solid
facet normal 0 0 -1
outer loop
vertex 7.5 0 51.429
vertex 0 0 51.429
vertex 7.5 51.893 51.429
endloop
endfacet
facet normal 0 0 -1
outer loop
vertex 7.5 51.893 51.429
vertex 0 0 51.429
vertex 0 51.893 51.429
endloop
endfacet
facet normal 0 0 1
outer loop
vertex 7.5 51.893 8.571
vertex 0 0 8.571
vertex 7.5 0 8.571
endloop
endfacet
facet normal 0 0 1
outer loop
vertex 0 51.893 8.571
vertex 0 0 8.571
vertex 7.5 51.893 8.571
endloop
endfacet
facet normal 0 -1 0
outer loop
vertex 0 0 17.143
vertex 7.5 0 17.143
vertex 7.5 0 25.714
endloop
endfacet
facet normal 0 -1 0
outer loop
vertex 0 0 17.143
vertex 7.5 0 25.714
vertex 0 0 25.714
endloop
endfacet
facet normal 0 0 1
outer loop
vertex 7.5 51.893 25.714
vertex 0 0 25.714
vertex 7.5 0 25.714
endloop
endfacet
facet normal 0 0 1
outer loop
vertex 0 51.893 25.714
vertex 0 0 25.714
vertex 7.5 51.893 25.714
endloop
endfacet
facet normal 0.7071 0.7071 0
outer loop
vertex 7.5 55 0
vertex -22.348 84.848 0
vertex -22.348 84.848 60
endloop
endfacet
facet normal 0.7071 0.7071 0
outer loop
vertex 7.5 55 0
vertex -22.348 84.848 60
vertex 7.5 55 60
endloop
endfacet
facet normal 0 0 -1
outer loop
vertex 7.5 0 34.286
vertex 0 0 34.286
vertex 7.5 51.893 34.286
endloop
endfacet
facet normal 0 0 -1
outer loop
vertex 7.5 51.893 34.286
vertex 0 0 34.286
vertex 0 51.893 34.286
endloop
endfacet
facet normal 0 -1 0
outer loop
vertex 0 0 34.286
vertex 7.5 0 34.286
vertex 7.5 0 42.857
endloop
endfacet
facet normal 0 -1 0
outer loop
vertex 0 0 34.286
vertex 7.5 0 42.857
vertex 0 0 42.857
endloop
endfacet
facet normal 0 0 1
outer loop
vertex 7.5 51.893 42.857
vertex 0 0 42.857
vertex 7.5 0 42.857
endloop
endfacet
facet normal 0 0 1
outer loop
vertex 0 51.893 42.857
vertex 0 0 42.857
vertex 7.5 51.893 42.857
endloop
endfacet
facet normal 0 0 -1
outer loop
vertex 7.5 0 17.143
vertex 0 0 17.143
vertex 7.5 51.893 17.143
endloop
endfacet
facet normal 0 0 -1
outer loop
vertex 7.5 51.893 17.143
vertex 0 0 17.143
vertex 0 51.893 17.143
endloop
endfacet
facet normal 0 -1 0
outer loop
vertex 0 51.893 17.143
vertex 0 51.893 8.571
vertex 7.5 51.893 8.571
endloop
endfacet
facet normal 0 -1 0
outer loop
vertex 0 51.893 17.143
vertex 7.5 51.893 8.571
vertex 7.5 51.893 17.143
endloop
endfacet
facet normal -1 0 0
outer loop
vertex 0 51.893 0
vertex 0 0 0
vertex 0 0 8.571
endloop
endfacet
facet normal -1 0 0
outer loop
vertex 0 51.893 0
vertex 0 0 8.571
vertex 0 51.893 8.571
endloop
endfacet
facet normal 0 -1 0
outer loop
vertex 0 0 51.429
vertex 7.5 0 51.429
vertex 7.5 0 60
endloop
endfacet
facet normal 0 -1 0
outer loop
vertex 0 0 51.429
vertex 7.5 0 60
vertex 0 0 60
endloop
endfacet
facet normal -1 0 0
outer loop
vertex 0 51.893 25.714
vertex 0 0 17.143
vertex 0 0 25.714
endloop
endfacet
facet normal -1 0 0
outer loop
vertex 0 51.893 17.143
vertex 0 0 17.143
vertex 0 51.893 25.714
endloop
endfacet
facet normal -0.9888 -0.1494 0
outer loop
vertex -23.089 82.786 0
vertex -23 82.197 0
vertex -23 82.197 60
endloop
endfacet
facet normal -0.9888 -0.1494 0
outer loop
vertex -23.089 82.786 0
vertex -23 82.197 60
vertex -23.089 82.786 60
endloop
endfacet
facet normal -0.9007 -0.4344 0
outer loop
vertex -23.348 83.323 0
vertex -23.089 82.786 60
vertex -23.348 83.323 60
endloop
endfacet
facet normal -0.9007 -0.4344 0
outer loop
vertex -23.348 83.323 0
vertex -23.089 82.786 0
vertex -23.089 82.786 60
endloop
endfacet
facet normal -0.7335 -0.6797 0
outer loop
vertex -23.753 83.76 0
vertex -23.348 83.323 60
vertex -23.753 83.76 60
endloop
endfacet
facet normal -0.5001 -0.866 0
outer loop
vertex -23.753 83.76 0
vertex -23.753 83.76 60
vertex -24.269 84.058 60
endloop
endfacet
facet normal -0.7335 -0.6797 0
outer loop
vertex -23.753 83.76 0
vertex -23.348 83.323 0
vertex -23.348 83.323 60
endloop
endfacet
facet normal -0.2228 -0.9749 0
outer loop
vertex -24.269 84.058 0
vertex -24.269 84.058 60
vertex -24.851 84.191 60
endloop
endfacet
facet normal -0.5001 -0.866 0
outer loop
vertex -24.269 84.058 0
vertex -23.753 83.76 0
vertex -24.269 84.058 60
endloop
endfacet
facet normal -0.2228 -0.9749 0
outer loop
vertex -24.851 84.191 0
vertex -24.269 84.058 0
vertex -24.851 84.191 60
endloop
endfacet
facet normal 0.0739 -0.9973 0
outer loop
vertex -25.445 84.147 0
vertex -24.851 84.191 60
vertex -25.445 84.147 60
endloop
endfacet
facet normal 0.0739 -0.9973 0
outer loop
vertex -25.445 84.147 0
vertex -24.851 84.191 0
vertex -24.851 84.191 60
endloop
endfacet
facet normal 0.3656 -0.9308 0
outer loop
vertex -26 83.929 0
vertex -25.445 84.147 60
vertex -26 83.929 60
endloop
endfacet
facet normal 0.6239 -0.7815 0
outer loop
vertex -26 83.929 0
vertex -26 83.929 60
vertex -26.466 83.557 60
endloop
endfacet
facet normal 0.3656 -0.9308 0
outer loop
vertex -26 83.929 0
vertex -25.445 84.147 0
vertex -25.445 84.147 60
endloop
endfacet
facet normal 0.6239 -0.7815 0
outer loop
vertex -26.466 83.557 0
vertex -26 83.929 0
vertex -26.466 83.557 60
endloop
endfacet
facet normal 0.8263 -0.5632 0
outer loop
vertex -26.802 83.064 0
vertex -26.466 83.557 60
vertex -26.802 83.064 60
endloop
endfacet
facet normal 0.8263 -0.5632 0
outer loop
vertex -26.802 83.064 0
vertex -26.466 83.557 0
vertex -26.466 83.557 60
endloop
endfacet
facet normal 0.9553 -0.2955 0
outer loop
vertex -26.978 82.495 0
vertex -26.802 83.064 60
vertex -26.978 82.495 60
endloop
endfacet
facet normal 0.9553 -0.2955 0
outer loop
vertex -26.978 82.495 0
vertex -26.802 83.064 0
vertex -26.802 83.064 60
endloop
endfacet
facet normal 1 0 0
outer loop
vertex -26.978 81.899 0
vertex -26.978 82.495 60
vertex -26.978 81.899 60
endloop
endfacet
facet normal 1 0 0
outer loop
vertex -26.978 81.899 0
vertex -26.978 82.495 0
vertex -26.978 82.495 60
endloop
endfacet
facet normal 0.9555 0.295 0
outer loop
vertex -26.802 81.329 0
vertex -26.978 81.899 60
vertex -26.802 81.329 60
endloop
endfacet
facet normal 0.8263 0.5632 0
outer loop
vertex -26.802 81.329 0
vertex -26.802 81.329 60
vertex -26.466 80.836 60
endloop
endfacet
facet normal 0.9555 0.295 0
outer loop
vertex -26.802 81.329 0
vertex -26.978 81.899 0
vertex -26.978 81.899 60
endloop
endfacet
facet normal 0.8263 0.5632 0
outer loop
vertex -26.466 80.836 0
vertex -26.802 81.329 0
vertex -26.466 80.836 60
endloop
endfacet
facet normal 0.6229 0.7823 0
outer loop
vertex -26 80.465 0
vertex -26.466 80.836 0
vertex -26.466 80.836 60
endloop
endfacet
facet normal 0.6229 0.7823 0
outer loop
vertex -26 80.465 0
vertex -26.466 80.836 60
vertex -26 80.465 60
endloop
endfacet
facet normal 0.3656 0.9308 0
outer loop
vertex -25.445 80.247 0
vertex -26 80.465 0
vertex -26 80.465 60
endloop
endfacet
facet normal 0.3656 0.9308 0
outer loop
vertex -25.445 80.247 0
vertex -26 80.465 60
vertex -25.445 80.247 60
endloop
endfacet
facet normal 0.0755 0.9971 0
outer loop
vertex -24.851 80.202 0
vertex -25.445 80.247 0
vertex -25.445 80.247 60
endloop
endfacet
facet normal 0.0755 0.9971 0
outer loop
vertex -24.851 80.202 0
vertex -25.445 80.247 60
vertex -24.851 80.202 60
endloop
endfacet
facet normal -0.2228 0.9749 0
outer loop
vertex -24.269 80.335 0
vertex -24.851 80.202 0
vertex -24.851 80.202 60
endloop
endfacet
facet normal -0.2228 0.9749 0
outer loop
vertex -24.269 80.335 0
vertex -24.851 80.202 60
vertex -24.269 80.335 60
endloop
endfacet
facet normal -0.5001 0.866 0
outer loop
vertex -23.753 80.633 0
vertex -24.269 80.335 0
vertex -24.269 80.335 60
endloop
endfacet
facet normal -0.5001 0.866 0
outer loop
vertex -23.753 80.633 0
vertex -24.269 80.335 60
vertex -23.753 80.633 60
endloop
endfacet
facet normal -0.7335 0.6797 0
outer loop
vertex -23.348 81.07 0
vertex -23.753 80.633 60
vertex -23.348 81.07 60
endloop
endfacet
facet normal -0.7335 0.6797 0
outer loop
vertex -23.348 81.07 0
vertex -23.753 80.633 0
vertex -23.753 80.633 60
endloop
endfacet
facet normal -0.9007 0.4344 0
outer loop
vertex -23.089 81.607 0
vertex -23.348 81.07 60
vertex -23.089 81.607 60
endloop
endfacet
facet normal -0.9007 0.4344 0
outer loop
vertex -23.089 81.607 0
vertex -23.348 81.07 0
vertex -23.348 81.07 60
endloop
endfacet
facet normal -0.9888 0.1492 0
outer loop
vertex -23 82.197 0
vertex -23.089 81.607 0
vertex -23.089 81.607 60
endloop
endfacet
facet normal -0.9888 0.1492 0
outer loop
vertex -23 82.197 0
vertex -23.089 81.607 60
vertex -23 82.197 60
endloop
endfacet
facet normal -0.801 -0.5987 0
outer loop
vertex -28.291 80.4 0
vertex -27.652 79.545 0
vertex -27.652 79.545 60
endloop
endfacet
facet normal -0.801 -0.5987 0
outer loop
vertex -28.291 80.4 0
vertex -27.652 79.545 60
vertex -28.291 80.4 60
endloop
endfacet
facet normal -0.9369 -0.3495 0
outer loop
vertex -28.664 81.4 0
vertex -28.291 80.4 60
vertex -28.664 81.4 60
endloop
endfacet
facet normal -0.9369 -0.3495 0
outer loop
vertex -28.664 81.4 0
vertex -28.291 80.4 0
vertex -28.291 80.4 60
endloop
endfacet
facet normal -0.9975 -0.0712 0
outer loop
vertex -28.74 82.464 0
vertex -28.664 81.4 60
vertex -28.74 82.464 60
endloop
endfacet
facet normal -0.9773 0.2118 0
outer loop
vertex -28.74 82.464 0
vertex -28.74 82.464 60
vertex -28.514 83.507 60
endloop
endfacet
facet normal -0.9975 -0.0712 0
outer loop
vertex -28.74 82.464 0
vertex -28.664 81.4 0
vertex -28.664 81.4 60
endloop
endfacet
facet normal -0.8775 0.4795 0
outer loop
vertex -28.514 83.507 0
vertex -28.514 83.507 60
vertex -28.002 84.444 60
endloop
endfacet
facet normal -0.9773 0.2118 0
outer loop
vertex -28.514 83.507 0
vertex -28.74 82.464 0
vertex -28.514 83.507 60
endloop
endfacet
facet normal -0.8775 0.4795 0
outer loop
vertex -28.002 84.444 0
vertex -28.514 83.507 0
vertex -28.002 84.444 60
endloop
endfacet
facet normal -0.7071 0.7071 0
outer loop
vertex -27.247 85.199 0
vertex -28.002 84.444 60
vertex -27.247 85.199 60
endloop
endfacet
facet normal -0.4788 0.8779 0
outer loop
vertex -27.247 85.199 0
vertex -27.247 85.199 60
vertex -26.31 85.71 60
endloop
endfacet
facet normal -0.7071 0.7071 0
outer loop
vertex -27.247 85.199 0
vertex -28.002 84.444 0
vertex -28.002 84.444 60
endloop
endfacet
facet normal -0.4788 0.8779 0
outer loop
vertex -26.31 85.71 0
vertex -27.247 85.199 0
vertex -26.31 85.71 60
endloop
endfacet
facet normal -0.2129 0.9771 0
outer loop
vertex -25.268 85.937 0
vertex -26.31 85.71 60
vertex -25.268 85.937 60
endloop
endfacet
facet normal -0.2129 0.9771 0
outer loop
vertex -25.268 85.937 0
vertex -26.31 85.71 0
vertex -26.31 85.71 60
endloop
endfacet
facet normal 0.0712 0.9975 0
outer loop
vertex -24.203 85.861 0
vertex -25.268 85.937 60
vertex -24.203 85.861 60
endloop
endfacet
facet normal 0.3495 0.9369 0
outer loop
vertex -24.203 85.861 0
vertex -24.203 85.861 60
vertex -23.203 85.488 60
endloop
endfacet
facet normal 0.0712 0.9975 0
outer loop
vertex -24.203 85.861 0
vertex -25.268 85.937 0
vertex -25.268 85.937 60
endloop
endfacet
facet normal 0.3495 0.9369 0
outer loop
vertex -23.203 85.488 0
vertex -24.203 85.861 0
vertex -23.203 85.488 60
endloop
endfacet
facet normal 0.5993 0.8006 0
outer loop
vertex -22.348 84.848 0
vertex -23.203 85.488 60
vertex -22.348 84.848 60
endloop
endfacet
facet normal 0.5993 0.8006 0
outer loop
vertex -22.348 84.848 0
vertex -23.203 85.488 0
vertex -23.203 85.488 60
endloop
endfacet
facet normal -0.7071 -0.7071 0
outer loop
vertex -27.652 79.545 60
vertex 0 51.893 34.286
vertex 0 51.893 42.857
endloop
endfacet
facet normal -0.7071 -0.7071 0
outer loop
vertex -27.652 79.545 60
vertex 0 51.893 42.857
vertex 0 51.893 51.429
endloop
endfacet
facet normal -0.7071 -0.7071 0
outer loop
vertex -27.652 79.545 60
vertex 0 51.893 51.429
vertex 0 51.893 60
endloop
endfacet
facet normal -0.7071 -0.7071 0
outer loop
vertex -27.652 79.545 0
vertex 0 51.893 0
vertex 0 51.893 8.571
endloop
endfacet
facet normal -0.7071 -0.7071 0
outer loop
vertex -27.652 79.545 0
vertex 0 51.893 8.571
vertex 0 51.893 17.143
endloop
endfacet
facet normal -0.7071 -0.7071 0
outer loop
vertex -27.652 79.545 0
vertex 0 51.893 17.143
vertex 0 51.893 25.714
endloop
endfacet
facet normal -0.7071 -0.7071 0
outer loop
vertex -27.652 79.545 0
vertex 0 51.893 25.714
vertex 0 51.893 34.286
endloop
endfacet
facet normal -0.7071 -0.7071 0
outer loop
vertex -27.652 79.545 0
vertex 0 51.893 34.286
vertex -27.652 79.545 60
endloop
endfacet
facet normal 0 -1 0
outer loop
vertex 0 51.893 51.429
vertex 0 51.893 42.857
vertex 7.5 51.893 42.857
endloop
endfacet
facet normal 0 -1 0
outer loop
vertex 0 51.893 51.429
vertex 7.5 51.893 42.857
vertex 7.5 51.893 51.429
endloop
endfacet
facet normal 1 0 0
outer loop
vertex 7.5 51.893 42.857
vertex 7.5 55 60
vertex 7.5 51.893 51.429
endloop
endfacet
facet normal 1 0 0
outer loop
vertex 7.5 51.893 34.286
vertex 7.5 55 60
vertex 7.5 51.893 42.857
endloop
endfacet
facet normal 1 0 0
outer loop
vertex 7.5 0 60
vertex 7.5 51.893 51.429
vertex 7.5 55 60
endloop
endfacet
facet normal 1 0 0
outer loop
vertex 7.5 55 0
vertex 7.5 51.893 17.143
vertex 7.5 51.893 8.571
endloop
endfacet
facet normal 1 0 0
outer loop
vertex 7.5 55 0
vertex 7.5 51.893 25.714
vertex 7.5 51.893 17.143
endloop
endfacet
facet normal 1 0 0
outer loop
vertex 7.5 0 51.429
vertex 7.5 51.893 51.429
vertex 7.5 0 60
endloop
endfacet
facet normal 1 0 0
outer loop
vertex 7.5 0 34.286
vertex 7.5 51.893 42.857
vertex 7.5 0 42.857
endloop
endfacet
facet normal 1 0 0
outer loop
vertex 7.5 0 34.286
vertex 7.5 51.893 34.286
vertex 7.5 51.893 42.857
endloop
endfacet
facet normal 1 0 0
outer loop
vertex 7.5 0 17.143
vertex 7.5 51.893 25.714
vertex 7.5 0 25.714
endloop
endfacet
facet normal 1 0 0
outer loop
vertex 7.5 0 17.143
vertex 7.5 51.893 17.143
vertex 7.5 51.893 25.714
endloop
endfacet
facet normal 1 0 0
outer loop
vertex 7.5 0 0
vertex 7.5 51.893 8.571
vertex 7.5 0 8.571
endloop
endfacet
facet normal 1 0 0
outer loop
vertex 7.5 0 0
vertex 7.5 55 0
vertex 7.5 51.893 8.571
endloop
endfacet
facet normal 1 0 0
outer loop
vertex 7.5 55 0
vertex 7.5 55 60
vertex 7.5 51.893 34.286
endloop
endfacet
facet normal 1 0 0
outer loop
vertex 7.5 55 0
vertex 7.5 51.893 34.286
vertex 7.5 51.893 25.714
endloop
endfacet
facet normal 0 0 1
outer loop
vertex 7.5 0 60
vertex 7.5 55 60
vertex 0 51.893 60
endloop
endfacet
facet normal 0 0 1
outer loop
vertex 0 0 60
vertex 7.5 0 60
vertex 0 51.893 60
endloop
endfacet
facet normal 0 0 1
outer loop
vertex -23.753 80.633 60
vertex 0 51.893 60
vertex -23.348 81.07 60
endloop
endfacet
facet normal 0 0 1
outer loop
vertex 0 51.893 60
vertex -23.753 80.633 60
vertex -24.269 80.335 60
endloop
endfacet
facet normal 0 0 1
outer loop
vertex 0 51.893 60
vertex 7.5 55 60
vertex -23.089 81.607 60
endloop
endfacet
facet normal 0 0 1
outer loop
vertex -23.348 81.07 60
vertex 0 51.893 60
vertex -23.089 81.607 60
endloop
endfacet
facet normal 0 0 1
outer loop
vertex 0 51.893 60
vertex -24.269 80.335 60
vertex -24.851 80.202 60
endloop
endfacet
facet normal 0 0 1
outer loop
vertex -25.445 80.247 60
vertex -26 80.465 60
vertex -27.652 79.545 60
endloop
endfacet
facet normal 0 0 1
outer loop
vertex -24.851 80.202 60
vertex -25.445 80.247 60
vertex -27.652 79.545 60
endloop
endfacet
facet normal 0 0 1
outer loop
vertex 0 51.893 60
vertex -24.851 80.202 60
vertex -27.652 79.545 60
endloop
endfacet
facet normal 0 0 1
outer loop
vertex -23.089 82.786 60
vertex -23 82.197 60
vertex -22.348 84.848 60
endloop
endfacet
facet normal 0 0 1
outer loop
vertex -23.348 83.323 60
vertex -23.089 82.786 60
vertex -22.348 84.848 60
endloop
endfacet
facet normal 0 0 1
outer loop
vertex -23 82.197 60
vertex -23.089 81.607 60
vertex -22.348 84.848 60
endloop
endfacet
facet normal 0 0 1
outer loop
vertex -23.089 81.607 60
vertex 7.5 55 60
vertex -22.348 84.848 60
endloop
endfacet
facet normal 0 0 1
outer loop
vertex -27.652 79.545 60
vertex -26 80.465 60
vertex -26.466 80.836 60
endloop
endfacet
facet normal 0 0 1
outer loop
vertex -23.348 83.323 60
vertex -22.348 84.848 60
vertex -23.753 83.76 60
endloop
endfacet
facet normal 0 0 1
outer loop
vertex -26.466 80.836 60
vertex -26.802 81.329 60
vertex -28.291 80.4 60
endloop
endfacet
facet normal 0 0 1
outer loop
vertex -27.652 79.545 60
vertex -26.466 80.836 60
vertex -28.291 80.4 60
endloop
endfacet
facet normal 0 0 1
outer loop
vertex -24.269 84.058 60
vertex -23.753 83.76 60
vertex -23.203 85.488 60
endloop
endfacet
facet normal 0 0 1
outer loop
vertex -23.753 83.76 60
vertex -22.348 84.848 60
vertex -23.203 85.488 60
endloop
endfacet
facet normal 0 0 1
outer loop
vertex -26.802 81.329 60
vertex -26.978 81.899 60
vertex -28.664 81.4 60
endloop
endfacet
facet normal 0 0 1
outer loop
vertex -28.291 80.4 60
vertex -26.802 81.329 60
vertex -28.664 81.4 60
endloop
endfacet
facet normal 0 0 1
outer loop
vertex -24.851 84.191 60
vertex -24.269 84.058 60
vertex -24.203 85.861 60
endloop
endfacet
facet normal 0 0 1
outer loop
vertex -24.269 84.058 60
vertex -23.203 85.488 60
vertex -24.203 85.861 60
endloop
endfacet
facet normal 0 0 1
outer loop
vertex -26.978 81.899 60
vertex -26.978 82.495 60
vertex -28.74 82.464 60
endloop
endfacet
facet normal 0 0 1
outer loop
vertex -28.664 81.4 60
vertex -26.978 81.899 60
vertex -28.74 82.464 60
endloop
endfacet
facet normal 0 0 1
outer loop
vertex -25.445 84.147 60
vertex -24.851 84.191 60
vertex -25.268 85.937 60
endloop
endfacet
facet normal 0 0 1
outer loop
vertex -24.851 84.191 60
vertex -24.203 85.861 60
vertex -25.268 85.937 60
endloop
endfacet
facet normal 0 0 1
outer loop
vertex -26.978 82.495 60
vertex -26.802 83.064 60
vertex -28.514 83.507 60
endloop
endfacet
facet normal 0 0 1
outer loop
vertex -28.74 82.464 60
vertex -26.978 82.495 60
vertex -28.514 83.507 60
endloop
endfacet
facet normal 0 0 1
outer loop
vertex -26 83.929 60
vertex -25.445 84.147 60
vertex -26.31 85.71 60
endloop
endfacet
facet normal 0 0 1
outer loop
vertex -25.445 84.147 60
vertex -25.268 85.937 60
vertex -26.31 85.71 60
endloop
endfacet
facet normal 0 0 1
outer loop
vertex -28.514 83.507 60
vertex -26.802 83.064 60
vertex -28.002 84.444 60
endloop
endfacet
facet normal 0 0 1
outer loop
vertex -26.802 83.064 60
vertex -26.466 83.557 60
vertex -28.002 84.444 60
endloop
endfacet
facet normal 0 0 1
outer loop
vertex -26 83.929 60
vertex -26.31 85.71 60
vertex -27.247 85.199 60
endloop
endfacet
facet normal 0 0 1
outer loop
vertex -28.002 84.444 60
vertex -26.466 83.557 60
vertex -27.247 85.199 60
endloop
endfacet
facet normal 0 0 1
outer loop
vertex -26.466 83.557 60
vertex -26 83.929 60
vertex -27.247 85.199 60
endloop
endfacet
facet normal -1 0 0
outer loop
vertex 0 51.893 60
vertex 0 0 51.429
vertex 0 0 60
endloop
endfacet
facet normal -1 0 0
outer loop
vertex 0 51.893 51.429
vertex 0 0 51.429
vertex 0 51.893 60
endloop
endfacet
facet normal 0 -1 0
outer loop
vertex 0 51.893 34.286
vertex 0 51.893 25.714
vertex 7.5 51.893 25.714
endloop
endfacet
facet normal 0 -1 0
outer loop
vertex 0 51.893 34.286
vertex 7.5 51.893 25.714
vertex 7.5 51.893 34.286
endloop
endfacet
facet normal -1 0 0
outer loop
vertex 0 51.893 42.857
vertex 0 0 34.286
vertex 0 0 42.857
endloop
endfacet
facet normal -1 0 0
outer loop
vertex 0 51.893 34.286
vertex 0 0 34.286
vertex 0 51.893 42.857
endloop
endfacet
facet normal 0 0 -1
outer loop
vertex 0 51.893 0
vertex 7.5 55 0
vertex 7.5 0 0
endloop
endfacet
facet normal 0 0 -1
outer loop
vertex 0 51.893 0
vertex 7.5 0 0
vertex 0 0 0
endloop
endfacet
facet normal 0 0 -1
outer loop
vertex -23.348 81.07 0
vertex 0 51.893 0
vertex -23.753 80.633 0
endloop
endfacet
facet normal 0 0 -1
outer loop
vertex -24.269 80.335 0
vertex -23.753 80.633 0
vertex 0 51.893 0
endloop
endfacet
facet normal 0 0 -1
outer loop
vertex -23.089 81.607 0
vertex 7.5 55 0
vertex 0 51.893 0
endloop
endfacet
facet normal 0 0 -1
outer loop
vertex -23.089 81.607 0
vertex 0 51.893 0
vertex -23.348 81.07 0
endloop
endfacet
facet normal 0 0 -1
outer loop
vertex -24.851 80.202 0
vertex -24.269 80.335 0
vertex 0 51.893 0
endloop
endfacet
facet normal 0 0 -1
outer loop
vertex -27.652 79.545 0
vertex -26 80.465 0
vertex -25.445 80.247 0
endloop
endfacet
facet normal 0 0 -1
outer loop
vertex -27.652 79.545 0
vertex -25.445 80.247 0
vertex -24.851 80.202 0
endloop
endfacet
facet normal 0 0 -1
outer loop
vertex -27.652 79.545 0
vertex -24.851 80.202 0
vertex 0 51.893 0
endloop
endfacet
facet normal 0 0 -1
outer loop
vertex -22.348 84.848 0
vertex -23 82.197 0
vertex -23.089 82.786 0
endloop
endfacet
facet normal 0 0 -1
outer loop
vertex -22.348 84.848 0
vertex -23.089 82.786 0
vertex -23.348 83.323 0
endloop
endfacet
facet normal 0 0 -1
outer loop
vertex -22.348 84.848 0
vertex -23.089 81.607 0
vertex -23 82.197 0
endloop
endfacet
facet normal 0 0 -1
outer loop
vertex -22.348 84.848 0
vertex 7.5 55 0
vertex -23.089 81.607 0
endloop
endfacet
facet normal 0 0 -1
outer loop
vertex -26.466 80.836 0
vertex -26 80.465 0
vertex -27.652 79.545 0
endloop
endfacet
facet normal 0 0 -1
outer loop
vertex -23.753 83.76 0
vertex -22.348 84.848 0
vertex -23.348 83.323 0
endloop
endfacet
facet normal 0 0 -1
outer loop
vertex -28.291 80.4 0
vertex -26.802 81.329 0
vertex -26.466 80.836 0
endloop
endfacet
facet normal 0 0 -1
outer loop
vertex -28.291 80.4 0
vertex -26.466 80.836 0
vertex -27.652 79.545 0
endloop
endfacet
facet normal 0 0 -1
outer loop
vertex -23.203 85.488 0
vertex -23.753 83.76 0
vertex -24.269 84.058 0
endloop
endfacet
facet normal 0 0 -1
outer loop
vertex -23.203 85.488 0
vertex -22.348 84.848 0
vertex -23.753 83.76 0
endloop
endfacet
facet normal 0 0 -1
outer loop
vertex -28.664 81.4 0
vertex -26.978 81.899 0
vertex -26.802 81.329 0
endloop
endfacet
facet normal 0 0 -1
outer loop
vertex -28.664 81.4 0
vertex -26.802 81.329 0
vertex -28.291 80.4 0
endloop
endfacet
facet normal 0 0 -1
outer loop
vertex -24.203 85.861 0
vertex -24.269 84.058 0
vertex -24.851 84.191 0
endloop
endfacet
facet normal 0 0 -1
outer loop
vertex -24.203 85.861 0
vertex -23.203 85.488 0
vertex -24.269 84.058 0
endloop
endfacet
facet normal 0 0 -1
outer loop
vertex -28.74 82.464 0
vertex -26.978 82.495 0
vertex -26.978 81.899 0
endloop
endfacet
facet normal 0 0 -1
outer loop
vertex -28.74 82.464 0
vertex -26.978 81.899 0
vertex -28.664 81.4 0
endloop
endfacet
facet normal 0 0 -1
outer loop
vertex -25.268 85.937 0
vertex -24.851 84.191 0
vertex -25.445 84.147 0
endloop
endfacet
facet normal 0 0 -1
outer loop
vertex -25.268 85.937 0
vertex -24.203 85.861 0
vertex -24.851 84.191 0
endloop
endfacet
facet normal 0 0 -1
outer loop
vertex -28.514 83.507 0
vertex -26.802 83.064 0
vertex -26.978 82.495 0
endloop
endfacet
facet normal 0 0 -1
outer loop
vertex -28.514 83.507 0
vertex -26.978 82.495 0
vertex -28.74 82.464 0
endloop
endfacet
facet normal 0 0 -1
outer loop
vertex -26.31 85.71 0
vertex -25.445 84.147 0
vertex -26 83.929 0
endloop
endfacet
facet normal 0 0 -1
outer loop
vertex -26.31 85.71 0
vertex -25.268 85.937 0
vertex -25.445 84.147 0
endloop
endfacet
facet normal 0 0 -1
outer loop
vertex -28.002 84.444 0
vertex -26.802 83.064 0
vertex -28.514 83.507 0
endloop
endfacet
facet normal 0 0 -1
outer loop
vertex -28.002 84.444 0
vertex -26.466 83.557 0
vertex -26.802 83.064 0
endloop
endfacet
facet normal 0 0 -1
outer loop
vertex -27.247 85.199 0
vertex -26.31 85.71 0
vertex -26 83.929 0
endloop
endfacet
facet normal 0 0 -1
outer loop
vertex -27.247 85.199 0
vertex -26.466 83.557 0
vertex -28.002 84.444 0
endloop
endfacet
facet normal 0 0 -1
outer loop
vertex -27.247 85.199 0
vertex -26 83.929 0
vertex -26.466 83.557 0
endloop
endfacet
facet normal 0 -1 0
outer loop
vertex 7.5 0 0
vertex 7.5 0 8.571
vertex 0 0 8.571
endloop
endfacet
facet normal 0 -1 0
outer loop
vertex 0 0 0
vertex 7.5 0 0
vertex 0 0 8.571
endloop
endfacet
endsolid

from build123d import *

# Parameters (mm, degrees)
SKETCH1_R           = 2
BOSS_EXTRUDE1_DEPTH = 60
SKETCH2_W           = 8.571428572
SKETCH2_H           = 51.893398282
CUT_EXTRUDE1_DEPTH  = 8.5


with BuildPart() as part:
    # Sketch1 → Boss-Extrude1 (new body)
    with BuildSketch(Plane.XY):
        with BuildLine():
            Line((0, 0), (0, 51.893398282))
            Line((0, 51.893398282), (-27.651650429, 79.545048712))
            ThreePointArc((-27.651650429, 79.545048712), (-27.651650429, 84.848349571), (-22.348349571, 84.848349571))
            Line((-22.348349571, 84.848349571), (7.5, 55))
            Line((7.5, 55), (7.5, 0))
            Line((7.5, 0), (0, 0))
        make_face()
        with Locations((-25, 82.196699141)):
            Circle(SKETCH1_R, mode=Mode.SUBTRACT)
    extrude(amount=BOSS_EXTRUDE1_DEPTH)

    # Sketch2 → Cut-Extrude1 (cut, through all)
    with BuildSketch(Plane.ZY):
        with Locations((30, 25.946699141)):
            Rectangle(SKETCH2_W, SKETCH2_H)
        with Locations((47.142857143, 25.946699141)):
            Rectangle(SKETCH2_W, SKETCH2_H)
        with Locations((12.857142857, 25.946699141)):
            Rectangle(SKETCH2_W, SKETCH2_H)
    extrude(amount=-CUT_EXTRUDE1_DEPTH, mode=Mode.SUBTRACT)


solid = part.part
